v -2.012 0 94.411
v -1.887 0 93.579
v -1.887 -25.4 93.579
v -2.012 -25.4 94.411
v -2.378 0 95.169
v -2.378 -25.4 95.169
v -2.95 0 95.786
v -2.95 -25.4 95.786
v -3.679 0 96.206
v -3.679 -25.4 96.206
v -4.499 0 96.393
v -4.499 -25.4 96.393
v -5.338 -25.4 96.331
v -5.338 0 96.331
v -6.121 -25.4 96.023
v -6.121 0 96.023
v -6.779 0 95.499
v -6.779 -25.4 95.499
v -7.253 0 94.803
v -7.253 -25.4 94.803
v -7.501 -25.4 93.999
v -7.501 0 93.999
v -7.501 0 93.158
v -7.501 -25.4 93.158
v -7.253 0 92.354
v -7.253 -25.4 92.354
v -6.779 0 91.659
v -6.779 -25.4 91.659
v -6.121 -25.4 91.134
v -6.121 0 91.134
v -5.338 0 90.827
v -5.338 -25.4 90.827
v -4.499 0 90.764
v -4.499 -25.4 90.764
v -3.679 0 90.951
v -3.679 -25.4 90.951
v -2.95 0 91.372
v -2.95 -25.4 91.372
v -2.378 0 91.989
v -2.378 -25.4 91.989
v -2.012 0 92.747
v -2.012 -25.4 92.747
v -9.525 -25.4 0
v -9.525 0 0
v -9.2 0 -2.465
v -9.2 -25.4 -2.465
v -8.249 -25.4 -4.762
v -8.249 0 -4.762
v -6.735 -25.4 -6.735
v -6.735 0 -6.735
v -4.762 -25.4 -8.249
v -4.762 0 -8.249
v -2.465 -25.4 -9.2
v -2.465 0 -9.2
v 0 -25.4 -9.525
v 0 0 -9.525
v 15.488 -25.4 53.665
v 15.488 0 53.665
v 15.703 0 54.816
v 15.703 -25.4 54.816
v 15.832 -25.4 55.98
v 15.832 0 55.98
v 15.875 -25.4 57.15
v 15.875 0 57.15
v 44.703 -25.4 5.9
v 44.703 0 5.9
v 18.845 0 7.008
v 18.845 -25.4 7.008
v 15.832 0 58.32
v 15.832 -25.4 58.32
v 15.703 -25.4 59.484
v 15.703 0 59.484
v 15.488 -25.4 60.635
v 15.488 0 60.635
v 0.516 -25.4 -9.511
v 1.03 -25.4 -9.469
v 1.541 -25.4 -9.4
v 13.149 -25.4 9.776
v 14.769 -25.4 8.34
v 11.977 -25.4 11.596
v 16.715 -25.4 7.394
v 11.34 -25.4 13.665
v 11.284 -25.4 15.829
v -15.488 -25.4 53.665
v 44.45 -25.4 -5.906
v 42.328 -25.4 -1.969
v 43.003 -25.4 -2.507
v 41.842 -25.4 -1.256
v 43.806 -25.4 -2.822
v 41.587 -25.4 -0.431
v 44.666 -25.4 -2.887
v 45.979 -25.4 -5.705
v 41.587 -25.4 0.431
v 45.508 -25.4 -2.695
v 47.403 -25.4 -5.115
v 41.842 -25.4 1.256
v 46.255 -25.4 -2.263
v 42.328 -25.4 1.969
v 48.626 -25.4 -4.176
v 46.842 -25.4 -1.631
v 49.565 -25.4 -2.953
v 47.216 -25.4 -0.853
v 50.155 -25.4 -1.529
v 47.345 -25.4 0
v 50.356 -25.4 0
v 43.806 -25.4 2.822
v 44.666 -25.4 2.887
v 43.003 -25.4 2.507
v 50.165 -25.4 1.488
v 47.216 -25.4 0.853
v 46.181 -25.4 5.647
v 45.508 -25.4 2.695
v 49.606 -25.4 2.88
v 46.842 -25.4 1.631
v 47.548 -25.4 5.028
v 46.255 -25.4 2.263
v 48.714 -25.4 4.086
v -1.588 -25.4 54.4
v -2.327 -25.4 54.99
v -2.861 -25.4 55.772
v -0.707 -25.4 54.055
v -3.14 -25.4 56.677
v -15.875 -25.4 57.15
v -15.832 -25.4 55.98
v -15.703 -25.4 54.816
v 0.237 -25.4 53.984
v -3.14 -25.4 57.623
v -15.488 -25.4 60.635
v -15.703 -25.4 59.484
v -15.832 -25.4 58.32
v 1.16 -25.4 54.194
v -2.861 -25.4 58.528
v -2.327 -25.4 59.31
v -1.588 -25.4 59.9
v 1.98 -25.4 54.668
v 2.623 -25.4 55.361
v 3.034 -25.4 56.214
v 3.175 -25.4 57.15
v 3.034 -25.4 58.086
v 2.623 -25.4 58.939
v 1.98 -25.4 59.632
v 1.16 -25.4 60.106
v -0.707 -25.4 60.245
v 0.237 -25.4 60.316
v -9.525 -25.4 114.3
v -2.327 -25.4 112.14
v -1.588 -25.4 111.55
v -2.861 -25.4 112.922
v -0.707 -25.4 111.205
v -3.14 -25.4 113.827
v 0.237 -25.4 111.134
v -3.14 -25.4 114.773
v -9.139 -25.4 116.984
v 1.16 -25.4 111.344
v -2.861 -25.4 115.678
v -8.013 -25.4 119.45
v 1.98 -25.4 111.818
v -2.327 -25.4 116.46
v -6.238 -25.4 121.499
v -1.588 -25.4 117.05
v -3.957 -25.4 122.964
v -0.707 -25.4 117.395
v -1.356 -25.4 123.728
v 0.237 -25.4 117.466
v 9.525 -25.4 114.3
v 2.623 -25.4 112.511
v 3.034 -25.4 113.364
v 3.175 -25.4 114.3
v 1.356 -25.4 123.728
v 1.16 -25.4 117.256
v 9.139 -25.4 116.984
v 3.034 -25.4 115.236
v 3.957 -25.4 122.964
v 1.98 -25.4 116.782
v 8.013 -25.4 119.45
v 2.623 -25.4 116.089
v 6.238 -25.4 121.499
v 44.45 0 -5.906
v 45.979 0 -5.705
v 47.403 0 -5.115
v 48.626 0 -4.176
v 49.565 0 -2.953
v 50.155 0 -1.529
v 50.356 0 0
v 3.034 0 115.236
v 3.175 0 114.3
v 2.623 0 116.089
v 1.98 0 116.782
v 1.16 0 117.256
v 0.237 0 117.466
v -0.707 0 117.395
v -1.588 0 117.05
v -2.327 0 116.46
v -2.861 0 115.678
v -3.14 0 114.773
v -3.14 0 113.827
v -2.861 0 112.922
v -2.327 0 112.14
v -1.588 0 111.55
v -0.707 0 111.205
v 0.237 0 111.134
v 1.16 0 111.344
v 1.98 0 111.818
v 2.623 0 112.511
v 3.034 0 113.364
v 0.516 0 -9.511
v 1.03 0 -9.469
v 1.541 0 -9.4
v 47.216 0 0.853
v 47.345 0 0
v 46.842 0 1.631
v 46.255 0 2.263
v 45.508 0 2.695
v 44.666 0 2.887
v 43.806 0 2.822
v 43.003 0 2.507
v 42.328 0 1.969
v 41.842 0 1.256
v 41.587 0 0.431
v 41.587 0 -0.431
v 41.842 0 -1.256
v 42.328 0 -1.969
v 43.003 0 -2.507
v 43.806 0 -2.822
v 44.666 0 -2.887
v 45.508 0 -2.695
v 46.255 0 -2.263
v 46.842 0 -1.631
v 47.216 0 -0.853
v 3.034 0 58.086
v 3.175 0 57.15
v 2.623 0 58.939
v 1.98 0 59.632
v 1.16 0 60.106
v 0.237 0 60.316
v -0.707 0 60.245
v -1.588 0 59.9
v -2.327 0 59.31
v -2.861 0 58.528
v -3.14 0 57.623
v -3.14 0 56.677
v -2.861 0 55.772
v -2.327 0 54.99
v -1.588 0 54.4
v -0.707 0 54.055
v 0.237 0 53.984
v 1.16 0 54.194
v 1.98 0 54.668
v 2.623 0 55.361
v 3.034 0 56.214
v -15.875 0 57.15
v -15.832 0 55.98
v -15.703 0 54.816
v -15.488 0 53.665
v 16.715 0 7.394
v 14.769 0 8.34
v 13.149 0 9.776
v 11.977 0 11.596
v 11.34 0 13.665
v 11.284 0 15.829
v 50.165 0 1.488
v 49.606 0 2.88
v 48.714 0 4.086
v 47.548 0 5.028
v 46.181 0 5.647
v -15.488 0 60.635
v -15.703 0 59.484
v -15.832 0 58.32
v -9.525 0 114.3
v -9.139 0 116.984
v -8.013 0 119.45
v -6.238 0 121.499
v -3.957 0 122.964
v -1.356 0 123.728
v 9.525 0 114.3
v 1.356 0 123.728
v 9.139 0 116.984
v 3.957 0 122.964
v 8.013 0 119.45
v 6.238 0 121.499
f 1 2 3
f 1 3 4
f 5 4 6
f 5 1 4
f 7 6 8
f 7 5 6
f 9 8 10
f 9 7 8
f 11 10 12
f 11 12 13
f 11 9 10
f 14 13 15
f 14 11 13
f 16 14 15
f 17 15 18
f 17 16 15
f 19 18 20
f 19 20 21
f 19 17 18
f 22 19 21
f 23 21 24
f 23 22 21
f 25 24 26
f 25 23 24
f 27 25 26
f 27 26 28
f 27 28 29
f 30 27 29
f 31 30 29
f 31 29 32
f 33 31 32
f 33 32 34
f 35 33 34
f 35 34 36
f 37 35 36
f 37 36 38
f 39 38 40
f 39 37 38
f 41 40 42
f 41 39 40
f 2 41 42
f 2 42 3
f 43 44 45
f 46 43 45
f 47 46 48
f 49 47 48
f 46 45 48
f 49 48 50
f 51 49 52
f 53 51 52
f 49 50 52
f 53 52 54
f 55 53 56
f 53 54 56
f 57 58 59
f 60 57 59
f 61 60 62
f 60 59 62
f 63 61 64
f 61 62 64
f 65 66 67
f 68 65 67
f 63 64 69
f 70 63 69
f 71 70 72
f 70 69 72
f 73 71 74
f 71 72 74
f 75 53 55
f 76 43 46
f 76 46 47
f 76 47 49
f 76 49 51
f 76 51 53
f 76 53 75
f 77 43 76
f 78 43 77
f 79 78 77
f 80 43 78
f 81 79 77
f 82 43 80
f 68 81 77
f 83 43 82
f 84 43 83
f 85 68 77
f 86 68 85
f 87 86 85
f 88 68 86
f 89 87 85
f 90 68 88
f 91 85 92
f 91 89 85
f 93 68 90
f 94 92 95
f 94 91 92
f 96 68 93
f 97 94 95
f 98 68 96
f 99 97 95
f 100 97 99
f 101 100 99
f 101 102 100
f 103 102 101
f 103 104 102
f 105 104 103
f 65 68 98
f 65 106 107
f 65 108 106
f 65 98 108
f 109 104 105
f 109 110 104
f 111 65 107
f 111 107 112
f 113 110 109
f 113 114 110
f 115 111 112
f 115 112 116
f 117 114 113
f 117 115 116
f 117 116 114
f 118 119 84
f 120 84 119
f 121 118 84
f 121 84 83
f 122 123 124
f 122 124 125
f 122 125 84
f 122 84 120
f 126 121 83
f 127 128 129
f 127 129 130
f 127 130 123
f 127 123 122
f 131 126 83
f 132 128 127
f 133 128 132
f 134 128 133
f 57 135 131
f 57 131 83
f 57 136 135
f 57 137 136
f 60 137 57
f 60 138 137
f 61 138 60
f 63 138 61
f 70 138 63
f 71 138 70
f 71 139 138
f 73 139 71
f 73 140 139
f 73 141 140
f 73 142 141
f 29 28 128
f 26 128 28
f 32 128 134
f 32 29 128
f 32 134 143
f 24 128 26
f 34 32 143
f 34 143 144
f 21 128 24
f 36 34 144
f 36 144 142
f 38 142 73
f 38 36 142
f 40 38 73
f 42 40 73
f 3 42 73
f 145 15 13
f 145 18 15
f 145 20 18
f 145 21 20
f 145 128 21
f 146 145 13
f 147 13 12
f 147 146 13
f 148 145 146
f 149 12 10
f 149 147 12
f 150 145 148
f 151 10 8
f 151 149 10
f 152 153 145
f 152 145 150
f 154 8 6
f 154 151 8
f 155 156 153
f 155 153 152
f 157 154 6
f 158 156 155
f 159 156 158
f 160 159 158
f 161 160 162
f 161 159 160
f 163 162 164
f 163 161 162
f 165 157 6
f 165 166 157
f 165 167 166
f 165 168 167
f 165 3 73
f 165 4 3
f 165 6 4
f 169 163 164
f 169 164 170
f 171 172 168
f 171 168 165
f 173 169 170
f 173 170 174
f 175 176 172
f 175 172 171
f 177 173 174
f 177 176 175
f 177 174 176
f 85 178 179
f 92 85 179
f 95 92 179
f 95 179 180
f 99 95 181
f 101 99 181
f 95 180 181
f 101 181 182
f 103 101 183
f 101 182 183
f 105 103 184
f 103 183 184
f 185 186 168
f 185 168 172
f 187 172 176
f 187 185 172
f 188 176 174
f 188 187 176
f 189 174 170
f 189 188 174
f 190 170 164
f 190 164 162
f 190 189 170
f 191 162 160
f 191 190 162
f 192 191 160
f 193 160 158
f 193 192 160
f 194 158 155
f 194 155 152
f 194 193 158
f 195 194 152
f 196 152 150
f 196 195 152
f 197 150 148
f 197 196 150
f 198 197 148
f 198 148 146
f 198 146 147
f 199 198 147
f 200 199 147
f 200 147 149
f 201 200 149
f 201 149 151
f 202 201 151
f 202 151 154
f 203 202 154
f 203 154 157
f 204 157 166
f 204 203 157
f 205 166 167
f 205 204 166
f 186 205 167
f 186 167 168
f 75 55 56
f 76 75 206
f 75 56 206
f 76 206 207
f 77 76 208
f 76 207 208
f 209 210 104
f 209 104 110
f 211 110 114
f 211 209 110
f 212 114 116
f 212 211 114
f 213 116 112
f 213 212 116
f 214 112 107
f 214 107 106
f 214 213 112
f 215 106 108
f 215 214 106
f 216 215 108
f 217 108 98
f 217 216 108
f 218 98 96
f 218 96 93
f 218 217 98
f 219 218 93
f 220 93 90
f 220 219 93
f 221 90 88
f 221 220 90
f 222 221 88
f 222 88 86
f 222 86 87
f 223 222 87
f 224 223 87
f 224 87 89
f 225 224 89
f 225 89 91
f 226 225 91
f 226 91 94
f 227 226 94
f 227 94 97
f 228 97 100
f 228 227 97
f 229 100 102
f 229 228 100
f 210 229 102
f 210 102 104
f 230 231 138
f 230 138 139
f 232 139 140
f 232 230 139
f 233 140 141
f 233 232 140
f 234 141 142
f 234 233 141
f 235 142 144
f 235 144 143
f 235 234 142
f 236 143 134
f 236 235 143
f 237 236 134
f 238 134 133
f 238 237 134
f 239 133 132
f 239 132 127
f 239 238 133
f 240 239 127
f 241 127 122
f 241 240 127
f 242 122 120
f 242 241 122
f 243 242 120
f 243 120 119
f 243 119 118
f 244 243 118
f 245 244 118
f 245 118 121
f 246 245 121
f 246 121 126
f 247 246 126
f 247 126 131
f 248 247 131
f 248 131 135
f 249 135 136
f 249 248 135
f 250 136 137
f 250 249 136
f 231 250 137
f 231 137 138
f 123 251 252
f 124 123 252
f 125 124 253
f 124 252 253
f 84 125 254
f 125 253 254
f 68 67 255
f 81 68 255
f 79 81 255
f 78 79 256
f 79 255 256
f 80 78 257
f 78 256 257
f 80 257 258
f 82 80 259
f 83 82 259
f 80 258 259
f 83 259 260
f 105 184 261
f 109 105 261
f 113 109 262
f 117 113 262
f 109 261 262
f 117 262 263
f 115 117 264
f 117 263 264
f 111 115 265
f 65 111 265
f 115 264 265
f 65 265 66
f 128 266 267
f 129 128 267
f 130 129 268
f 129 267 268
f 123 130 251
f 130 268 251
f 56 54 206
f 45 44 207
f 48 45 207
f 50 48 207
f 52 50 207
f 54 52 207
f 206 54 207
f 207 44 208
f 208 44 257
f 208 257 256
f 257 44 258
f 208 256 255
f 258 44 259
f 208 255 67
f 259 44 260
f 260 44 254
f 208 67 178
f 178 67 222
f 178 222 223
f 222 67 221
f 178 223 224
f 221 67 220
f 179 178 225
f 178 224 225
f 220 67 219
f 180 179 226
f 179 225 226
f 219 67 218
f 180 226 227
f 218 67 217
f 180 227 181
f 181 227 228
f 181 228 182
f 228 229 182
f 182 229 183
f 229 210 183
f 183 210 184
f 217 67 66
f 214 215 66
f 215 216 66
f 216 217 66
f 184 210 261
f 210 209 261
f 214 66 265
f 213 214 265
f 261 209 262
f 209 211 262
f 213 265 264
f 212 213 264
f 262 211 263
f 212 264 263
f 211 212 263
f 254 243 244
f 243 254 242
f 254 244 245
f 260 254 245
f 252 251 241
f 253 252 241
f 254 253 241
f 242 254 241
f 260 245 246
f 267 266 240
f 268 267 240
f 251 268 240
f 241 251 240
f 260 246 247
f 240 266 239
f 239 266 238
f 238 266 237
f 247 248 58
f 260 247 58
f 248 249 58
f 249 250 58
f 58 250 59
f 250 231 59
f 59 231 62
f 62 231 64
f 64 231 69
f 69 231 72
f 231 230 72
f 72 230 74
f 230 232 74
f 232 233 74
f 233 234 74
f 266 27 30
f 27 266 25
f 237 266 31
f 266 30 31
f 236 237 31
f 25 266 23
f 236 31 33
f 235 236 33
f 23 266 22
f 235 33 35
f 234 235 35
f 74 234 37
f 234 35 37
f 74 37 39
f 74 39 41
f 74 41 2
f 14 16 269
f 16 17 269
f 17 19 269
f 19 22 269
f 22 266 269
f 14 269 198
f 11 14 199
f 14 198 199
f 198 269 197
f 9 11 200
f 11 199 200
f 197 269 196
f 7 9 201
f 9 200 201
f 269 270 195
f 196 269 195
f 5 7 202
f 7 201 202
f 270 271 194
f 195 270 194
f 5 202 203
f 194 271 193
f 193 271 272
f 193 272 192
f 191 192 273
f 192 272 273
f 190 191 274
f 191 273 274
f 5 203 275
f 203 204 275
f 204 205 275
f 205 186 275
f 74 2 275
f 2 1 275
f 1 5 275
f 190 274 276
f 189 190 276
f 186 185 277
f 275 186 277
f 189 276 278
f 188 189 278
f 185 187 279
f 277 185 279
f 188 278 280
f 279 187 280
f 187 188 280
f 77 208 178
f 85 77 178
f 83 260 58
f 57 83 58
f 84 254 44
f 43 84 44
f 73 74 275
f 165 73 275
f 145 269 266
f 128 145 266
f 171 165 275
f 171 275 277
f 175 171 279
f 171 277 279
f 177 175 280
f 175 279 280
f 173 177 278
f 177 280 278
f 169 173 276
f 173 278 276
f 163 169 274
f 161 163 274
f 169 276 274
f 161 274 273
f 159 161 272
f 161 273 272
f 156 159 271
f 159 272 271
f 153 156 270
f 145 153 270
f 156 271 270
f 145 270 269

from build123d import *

# Parameters (mm, degrees)
F0_R     = 3.175
F0_R_2   = 2.8227407603
F0_R_3   = 2.8948343133
F1_DEPTH = 25.4


with BuildPart() as f1:
    # F0 (on Front) → F1 (new body)
    with BuildSketch(Plane.XZ):
        with BuildLine():
            ThreePointArc((-9.525, 114.3), (0, 104.775), (9.525, 114.3))
            ThreePointArc((9.525, 114.3), (0, 123.825), (-9.525, 114.3))
        make_face()
        with Locations((0, 114.3)):
            Circle(F0_R, mode=Mode.SUBTRACT)
        with BuildLine():
            Line((15.487804878, 60.6347560976), (9.525, 114.3))
            ThreePointArc((9.525, 114.3), (0, 104.775), (-9.525, 114.3))
            Line((-9.525, 114.3), (-15.487804878, 60.6347560976))
            ThreePointArc((-15.487804878, 60.6347560976), (0, 73.025), (15.487804878, 60.6347560976))
        make_face()
        with Locations((-4.7098048963, 93.5786440969)):
            Circle(F0_R_2, mode=Mode.SUBTRACT)
        with BuildLine():
            Line((15.875, 57.15), (15.487804878, 60.6347560976))
            ThreePointArc((15.487804878, 60.6347560976), (0, 73.025), (-15.487804878, 60.6347560976))
            Line((-15.487804878, 60.6347560976), (-15.875, 57.15))
            Line((-15.875, 57.15), (-15.487804878, 53.6652439024))
            ThreePointArc((-15.487804878, 53.6652439024), (0, 41.275), (15.487804878, 53.6652439024))
            Line((15.487804878, 53.6652439024), (15.875, 57.15))
        make_face()
        with Locations((0, 57.15)):
            Circle(F0_R, mode=Mode.SUBTRACT)
        with BuildLine():
            ThreePointArc((15.875, 57.15), (15.7779042879, 58.9031004764), (15.487804878, 60.6347560976))
            Line((15.487804878, 60.6347560976), (15.875, 57.15))
        make_face()
        with BuildLine():
            Line((-15.875, 57.15), (-15.487804878, 60.6347560976))
            ThreePointArc((-15.487804878, 60.6347560976), (-15.7779042879, 58.9031004764), (-15.875, 57.15))
        make_face()
        with BuildLine():
            ThreePointArc((15.487804878, 53.6652439024), (15.7779042879, 55.3968995236), (15.875, 57.15))
            Line((15.875, 57.15), (15.487804878, 53.6652439024))
        make_face()
        with BuildLine():
            Line((-15.487804878, 53.6652439024), (-15.875, 57.15))
            ThreePointArc((-15.875, 57.15), (-15.7779042879, 55.3968995236), (-15.487804878, 53.6652439024))
        make_face()
        with BuildLine():
            Line((11.2837349209, 15.8286142885), (15.487804878, 53.6652439024))
            ThreePointArc((15.487804878, 53.6652439024), (0, 41.275), (-15.487804878, 53.6652439024))
            Line((-15.487804878, 53.6652439024), (-9.525, 0))
            ThreePointArc((-9.525, 0), (0, 9.525), (9.525, 0))
            ThreePointArc((9.525, 0), (7.2595482465, -6.1664077271), (1.5408353267, -9.3995452813))
            Line((1.5408353267, -9.3995452813), (44.45, -5.9058837015))
            ThreePointArc((44.45, -5.9058837015), (38.545468302, 0.1263634545), (44.7026690535, 5.9004763066))
            Line((44.7026690535, 5.9004763066), (18.8451791707, 7.0077407296))
            ThreePointArc((18.8451791707, 7.0077407296), (13.1493027106, 9.7764656492), (11.2837349209, 15.8286142885))
        make_face()
        with BuildLine():
            Line((0, 0), (-9.525, 0))
            ThreePointArc((-9.525, 0), (-6.7351920908, -6.7351920908), (0, -9.525))
            Line((0, -9.525), (0, 0))
        make_face()
        with BuildLine():
            ThreePointArc((9.525, 0), (0, 9.525), (-9.525, 0))
            Line((-9.525, 0), (0, 0))
            Line((0, 0), (0, -9.525))
            Line((0, -9.525), (1.5408353267, -9.3995452813))
            ThreePointArc((1.5408353267, -9.3995452813), (7.2595482465, -6.1664077271), (9.525, 0))
        make_face()
        with BuildLine():
            Line((1.5408353267, -9.3995452813), (0, -9.525))
            ThreePointArc((0, -9.525), (0.7729670741, -9.4935845128), (1.5408353267, -9.3995452813))
        make_face()
        with BuildLine():
            ThreePointArc((50.3558837015, 0), (48.7144868589, 4.0857819478), (44.7026690535, 5.9004763066))
            ThreePointArc((44.7026690535, 5.9004763066), (38.545468302, 0.1263634545), (44.45, -5.9058837015))
            ThreePointArc((44.45, -5.9058837015), (48.6260904142, -4.1760904142), (50.3558837015, 0))
        make_face()
        with Locations((44.45, 0)):
            Circle(F0_R_3, mode=Mode.SUBTRACT)
    extrude(amount=F1_DEPTH)


solid = f1.part
